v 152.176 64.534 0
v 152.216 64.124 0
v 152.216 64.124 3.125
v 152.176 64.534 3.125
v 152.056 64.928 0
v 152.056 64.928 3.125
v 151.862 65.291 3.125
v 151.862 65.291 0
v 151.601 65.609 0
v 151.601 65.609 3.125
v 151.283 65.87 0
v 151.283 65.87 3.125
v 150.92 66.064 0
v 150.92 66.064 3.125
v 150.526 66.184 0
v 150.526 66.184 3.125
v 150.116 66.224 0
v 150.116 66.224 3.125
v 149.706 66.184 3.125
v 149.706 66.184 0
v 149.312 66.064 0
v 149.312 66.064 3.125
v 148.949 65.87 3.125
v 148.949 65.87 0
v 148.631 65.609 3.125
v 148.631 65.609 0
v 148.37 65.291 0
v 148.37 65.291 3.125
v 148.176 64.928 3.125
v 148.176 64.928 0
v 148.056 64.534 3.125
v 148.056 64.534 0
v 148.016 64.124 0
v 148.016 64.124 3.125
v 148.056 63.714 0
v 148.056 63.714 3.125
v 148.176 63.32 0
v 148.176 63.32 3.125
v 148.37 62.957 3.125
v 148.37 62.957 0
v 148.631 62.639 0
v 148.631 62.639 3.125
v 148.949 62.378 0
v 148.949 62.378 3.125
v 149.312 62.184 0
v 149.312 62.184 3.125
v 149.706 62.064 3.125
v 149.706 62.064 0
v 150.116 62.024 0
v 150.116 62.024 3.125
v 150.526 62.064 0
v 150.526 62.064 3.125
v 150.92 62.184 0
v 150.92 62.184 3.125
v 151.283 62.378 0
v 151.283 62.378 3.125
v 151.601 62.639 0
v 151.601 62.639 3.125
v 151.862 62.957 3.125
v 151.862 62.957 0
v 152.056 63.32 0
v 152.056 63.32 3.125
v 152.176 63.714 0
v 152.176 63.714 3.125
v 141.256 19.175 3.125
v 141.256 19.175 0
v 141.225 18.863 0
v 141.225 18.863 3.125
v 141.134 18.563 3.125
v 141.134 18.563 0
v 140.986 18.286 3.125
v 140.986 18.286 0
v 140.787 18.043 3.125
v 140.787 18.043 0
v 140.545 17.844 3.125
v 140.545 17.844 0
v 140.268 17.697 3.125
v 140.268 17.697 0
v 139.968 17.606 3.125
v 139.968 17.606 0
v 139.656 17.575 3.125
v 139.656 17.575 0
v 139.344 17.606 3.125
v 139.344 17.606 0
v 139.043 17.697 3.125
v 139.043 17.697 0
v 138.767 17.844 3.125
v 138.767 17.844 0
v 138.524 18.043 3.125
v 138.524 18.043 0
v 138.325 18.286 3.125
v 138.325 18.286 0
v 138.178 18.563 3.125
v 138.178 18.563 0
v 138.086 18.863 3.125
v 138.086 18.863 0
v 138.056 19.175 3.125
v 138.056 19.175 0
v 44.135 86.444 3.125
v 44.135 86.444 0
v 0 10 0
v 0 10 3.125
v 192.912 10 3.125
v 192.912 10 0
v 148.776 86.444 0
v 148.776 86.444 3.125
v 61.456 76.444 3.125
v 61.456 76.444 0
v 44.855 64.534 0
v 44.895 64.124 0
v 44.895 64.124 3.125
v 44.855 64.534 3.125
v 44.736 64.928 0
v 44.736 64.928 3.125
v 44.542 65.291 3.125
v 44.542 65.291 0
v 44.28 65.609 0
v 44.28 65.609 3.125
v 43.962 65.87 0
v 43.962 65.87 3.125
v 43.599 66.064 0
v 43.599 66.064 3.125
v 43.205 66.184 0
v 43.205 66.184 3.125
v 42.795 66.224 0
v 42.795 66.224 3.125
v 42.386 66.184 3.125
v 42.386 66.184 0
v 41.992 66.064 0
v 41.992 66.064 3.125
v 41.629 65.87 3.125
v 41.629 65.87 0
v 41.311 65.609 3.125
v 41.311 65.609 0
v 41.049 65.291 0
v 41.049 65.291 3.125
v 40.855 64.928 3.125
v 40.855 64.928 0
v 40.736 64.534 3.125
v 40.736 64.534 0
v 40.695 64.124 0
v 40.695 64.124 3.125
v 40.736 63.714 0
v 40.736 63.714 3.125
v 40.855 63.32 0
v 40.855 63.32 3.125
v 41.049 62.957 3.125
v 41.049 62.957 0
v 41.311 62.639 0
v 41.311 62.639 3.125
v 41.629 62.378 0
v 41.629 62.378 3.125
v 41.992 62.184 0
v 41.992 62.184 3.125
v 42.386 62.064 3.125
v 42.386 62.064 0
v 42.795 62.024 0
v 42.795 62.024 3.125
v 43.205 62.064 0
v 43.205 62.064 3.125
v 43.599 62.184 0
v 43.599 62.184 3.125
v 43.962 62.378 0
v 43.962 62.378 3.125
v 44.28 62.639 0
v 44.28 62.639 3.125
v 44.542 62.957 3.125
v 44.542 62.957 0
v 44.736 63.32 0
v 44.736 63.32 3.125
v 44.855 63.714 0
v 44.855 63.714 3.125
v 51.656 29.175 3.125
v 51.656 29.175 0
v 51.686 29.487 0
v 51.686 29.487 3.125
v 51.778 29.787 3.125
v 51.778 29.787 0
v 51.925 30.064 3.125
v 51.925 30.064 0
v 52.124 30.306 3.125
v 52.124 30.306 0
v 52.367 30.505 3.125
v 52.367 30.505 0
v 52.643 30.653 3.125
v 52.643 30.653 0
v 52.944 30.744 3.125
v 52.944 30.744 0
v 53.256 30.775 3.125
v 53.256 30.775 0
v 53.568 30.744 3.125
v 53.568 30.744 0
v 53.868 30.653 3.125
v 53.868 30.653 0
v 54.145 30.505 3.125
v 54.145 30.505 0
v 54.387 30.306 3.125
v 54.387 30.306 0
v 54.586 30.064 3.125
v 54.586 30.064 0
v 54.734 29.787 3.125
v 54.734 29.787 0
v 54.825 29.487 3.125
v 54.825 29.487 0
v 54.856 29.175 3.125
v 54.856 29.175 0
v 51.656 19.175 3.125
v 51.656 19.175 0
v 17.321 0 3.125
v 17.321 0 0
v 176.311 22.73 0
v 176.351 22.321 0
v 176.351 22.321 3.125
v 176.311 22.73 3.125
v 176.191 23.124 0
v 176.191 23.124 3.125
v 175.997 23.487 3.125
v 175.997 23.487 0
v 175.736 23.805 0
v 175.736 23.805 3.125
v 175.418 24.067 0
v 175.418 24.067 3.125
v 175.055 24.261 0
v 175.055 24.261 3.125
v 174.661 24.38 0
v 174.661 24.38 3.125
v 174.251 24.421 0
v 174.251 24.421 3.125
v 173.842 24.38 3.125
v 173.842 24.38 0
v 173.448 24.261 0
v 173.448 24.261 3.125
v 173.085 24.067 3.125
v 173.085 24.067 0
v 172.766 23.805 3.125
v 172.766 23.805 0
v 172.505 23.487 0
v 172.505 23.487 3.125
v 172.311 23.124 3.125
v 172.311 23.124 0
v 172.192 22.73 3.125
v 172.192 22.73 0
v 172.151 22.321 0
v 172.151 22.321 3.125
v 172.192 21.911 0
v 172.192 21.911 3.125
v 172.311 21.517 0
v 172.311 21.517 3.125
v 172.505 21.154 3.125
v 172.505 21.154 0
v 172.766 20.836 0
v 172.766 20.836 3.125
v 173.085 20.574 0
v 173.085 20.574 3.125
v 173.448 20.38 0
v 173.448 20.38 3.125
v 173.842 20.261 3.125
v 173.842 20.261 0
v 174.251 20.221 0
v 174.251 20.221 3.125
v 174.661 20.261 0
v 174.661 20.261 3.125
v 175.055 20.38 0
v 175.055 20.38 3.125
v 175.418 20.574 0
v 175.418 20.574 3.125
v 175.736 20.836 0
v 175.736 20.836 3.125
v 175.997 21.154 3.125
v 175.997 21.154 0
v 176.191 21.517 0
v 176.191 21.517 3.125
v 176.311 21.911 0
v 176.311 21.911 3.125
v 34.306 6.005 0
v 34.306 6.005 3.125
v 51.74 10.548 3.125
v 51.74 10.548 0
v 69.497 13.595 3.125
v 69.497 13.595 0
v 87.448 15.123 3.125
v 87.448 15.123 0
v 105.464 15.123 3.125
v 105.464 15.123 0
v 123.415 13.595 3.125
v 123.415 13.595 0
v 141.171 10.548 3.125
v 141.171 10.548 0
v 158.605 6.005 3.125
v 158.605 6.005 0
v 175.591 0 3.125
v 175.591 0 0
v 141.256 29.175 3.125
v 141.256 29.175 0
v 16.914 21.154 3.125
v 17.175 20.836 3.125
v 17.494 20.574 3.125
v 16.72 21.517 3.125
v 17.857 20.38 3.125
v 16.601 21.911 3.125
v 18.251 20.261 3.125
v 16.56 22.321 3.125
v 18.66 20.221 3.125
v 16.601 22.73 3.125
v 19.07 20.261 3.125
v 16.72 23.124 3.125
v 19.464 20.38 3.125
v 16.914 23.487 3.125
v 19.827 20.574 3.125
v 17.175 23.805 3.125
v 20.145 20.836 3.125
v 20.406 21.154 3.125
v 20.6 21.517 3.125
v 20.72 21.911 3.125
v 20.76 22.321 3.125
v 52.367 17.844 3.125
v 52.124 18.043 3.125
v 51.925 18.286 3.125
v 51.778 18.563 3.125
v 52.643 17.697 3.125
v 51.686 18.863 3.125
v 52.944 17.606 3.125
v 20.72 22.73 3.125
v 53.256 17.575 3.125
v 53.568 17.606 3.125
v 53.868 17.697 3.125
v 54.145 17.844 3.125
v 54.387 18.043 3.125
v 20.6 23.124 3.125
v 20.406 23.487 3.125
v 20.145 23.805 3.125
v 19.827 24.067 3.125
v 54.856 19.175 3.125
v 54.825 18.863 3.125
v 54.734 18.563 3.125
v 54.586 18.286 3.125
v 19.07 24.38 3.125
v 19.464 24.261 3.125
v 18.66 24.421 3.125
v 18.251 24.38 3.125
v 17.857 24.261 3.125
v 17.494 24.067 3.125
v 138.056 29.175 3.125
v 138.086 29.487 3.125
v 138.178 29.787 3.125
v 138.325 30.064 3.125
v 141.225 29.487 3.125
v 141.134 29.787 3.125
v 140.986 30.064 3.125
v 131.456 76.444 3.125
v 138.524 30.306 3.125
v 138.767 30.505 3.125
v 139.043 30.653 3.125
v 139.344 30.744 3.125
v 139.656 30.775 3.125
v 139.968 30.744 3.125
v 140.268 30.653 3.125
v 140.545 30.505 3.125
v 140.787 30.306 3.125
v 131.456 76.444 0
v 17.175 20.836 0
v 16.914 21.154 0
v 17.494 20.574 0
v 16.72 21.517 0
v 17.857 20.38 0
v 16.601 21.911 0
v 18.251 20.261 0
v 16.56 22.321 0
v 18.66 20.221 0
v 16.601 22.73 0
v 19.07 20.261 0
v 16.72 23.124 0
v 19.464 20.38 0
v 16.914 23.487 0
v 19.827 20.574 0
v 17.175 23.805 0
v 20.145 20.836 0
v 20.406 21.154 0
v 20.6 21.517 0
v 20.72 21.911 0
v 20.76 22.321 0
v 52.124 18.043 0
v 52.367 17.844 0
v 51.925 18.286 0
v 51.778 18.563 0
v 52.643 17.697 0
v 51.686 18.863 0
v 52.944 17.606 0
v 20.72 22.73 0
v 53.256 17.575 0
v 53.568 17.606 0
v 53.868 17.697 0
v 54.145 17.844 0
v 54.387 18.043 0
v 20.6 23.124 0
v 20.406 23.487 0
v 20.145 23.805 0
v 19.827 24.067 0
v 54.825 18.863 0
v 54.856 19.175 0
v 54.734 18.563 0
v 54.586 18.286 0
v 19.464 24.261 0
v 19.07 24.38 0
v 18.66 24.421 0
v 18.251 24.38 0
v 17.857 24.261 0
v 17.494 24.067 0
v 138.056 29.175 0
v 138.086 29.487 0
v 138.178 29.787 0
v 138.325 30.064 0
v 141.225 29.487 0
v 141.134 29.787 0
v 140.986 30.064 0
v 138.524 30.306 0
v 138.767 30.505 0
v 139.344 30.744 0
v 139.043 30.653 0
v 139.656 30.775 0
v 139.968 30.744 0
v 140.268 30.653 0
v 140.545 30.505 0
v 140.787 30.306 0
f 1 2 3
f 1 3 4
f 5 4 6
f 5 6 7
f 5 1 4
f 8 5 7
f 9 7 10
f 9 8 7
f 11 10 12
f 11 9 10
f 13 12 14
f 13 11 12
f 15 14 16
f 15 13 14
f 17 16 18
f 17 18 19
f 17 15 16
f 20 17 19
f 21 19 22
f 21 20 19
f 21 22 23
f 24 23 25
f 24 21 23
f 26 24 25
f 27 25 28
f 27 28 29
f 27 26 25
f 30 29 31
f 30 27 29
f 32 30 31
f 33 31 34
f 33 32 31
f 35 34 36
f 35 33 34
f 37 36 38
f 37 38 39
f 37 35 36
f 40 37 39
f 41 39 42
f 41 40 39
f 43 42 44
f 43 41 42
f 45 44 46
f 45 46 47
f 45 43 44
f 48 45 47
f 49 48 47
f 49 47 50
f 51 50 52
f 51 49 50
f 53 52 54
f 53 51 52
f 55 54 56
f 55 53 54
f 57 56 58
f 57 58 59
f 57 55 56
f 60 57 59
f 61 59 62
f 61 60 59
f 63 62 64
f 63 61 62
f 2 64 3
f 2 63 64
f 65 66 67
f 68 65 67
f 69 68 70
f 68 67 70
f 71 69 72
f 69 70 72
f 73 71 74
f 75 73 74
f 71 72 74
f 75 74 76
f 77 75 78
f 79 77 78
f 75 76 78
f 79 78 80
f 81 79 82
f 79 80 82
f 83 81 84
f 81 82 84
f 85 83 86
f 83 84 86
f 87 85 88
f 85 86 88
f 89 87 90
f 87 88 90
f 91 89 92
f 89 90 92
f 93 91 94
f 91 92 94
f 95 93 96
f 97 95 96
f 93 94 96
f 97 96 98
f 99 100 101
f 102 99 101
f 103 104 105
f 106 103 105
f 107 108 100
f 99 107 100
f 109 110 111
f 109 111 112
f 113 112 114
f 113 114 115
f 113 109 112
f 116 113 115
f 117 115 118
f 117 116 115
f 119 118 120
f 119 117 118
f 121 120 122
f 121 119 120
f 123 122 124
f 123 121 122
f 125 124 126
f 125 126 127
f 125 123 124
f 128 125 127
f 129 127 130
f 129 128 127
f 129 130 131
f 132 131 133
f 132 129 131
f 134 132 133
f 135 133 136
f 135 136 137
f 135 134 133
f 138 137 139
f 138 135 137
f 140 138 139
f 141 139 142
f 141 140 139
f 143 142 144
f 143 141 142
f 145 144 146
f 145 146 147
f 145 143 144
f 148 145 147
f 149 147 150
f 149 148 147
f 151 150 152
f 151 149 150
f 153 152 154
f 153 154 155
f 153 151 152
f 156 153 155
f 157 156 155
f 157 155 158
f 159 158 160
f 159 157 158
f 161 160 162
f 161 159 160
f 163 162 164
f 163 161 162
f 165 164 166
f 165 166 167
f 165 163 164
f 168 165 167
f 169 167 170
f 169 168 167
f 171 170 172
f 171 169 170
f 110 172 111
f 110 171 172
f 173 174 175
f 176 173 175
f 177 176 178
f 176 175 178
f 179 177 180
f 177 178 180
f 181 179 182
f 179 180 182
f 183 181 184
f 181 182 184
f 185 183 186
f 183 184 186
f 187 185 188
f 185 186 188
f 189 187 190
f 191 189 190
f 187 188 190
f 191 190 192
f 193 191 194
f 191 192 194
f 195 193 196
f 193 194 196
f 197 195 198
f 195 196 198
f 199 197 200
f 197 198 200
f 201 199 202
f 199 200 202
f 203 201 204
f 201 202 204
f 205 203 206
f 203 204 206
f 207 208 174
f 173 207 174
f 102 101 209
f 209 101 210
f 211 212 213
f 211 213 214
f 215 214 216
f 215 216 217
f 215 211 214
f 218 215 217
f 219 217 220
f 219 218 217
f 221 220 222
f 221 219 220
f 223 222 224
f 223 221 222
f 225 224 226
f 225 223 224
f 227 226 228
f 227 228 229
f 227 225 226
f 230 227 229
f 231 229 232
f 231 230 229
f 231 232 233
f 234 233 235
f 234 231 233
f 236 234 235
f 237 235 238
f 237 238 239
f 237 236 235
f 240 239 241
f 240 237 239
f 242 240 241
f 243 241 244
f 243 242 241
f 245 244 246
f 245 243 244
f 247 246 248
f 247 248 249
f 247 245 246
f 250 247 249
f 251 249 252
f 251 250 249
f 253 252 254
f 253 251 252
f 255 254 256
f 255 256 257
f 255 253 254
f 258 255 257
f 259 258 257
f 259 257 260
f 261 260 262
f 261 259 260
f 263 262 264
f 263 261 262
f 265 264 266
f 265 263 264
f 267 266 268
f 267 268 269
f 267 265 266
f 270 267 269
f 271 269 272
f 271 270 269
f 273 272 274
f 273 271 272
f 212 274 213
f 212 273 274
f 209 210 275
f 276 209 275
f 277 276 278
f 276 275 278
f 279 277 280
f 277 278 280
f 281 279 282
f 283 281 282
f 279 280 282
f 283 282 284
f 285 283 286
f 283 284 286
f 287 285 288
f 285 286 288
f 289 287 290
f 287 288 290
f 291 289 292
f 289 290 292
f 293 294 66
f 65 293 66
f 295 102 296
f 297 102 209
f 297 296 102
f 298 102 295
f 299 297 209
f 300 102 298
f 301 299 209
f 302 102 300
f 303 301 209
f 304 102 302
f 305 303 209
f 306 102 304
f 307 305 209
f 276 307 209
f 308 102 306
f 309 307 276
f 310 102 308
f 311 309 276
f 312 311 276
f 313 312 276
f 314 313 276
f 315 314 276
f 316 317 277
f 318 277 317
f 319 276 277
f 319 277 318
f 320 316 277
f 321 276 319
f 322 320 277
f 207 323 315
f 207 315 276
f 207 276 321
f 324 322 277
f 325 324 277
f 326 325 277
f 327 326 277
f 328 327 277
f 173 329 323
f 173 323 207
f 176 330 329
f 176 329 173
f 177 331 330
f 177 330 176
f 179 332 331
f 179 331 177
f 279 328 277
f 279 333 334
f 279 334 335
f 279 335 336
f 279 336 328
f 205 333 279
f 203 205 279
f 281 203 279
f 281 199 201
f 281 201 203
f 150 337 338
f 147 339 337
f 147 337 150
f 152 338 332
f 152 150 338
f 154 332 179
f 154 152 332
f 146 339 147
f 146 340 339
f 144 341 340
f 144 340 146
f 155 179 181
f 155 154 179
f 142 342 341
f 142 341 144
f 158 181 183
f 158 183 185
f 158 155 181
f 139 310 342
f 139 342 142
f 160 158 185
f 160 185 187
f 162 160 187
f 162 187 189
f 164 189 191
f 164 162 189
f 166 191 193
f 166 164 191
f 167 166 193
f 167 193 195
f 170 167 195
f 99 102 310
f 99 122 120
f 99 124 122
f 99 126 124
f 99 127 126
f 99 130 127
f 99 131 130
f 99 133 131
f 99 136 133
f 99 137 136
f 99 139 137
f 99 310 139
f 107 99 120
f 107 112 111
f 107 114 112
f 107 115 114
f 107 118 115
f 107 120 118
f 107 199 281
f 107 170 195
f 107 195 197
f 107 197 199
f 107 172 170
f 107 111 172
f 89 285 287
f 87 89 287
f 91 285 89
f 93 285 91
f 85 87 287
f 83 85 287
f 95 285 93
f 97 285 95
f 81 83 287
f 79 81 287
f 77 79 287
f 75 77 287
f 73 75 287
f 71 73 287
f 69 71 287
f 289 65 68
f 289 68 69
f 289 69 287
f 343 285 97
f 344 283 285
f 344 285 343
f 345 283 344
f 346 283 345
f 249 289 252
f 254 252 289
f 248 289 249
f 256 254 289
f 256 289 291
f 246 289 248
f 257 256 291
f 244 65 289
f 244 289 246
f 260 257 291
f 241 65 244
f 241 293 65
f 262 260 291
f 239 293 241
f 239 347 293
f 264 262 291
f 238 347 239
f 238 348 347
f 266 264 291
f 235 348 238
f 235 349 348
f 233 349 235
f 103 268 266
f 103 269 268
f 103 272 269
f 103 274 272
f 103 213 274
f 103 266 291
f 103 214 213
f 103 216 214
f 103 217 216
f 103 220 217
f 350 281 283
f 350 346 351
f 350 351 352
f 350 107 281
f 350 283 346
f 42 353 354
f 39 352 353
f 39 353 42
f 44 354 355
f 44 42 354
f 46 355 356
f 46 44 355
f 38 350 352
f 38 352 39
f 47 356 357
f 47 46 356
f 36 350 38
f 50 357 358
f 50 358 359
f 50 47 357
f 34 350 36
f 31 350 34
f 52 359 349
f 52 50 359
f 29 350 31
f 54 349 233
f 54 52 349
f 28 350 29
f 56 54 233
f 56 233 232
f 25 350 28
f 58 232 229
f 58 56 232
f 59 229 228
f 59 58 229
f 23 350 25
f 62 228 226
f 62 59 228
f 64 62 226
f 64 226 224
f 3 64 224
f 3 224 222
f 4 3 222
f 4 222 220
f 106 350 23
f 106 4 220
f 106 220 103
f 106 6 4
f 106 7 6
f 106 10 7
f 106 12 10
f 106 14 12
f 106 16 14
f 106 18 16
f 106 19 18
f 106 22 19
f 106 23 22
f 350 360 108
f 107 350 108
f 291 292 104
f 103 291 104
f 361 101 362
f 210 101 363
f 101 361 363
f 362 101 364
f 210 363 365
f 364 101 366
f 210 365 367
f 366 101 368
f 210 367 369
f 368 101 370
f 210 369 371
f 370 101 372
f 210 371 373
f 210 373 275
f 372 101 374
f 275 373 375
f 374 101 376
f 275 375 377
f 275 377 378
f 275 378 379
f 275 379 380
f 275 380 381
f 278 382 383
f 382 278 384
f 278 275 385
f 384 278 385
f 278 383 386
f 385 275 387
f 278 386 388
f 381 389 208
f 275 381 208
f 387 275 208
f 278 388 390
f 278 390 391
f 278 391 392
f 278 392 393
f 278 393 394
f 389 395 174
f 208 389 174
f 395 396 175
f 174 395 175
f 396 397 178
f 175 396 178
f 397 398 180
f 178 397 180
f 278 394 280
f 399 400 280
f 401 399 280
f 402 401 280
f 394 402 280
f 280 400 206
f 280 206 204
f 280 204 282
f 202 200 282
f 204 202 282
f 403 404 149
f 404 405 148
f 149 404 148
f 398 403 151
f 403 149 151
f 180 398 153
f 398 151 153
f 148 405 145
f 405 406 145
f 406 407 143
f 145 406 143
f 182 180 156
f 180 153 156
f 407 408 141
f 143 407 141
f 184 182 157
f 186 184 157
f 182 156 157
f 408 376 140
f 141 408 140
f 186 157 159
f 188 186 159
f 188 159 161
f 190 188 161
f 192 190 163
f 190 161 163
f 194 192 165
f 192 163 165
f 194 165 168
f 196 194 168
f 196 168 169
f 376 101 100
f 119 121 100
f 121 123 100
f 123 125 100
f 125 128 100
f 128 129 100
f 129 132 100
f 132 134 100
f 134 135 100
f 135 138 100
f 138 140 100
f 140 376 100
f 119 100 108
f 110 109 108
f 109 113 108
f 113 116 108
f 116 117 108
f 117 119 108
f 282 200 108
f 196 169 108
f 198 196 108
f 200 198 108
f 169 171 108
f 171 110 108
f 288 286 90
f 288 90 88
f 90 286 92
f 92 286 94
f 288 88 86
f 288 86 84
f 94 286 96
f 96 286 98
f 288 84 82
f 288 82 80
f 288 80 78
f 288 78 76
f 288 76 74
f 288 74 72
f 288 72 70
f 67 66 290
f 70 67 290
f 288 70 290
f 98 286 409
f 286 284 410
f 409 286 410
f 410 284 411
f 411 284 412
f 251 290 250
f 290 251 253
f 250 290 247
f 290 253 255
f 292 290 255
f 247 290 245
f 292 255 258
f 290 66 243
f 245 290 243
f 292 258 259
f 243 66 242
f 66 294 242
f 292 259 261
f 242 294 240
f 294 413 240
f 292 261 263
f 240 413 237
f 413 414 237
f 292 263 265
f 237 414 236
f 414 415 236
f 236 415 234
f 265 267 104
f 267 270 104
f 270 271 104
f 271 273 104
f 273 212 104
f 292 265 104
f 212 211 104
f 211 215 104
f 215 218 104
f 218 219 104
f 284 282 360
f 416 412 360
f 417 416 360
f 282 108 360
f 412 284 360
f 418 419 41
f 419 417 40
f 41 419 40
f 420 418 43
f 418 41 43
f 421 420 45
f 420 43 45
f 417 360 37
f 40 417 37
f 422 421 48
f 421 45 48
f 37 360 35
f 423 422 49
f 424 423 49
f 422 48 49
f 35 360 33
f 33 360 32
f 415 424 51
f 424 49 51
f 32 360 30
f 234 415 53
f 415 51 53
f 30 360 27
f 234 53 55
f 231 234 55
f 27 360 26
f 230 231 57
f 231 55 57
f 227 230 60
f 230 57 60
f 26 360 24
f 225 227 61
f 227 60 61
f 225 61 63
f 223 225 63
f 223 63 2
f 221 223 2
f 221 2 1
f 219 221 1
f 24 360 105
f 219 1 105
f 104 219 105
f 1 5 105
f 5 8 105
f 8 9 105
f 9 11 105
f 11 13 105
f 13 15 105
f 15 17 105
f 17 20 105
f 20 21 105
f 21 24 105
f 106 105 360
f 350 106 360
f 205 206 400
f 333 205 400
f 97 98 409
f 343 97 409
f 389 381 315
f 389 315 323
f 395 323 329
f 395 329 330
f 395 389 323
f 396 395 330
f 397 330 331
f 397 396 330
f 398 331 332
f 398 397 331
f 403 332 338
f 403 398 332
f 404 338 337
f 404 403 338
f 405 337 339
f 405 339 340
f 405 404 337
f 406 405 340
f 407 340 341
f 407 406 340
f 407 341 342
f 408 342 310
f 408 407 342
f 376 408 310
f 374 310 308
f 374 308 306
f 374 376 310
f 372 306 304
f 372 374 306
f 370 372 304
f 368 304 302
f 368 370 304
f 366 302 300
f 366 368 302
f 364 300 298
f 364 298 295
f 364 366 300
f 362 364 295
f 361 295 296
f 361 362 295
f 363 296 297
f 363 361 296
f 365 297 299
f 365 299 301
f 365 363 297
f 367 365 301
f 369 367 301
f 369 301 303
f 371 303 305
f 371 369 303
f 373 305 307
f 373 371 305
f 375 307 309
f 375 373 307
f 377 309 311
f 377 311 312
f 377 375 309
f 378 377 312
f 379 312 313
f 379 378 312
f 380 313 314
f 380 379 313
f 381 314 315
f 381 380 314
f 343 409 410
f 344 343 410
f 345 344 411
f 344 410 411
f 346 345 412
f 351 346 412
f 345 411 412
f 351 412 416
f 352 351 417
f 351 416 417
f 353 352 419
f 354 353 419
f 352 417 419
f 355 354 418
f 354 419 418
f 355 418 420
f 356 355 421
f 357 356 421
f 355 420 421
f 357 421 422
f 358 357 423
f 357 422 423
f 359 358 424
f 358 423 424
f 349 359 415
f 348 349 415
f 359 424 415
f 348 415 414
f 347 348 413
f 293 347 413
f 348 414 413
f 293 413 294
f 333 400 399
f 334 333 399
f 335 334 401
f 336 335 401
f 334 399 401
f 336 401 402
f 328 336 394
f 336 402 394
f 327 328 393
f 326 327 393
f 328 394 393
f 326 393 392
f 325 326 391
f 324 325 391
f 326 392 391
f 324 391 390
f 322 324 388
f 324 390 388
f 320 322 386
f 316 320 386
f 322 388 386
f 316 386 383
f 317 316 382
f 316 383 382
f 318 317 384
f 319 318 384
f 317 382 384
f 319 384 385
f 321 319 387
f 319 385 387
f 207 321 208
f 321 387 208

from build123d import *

# Parameters (mm, degrees)
MODEL_R             = 2.1
BOSS_EXTRUDE1_DEPTH = 3.125


with BuildPart() as part:
    # Model → Boss-Extrude1 (new body)
    with BuildSketch(Plane.XY):
        with BuildLine():
            Line((175.590993043, 0), (192.911501119, 10))
            Line((192.911501119, 10), (148.776258635, 86.444482386))
            Line((148.776258635, 86.444482386), (131.455750559, 76.444482386))
            Line((131.455750559, 76.444482386), (61.455750559, 76.444482386))
            Line((61.455750559, 76.444482386), (44.135242484, 86.444482386))
            Line((44.135242484, 86.444482386), (0, 10))
            Line((0, 10), (17.320508076, 0))
            ThreePointArc((17.320508076, 0), (96.455750559, 15.314685), (175.590993043, 0))
        make_face()
        with Locations((42.795496522, 64.123974311)):
            Circle(MODEL_R, mode=Mode.SUBTRACT)
        with Locations((18.660254038, 22.320508076)):
            Circle(MODEL_R, mode=Mode.SUBTRACT)
        with Locations((150.116004597, 64.123974311)):
            Circle(MODEL_R, mode=Mode.SUBTRACT)
        with Locations((174.251247081, 22.320508076)):
            Circle(MODEL_R, mode=Mode.SUBTRACT)
        with BuildLine():
            Line((54.855750559, 29.174833766), (54.855750559, 19.174833766))
            ThreePointArc((54.855750559, 19.174833766), (53.255750559, 17.574833766), (51.655750559, 19.174833766))
            Line((51.655750559, 19.174833766), (51.655750559, 29.174833766))
            ThreePointArc((51.655750559, 29.174833766), (53.255750559, 30.774833766), (54.855750559, 29.174833766))
        make_face(mode=Mode.SUBTRACT)
        with BuildLine():
            Line((141.255750559, 29.174833766), (141.255750559, 19.174833766))
            ThreePointArc((141.255750559, 19.174833766), (139.655750559, 17.574833766), (138.055750559, 19.174833766))
            Line((138.055750559, 19.174833766), (138.055750559, 29.174833766))
            ThreePointArc((138.055750559, 29.174833766), (139.655750559, 30.774833766), (141.255750559, 29.174833766))
        make_face(mode=Mode.SUBTRACT)
    extrude(amount=BOSS_EXTRUDE1_DEPTH)


solid = part.part
